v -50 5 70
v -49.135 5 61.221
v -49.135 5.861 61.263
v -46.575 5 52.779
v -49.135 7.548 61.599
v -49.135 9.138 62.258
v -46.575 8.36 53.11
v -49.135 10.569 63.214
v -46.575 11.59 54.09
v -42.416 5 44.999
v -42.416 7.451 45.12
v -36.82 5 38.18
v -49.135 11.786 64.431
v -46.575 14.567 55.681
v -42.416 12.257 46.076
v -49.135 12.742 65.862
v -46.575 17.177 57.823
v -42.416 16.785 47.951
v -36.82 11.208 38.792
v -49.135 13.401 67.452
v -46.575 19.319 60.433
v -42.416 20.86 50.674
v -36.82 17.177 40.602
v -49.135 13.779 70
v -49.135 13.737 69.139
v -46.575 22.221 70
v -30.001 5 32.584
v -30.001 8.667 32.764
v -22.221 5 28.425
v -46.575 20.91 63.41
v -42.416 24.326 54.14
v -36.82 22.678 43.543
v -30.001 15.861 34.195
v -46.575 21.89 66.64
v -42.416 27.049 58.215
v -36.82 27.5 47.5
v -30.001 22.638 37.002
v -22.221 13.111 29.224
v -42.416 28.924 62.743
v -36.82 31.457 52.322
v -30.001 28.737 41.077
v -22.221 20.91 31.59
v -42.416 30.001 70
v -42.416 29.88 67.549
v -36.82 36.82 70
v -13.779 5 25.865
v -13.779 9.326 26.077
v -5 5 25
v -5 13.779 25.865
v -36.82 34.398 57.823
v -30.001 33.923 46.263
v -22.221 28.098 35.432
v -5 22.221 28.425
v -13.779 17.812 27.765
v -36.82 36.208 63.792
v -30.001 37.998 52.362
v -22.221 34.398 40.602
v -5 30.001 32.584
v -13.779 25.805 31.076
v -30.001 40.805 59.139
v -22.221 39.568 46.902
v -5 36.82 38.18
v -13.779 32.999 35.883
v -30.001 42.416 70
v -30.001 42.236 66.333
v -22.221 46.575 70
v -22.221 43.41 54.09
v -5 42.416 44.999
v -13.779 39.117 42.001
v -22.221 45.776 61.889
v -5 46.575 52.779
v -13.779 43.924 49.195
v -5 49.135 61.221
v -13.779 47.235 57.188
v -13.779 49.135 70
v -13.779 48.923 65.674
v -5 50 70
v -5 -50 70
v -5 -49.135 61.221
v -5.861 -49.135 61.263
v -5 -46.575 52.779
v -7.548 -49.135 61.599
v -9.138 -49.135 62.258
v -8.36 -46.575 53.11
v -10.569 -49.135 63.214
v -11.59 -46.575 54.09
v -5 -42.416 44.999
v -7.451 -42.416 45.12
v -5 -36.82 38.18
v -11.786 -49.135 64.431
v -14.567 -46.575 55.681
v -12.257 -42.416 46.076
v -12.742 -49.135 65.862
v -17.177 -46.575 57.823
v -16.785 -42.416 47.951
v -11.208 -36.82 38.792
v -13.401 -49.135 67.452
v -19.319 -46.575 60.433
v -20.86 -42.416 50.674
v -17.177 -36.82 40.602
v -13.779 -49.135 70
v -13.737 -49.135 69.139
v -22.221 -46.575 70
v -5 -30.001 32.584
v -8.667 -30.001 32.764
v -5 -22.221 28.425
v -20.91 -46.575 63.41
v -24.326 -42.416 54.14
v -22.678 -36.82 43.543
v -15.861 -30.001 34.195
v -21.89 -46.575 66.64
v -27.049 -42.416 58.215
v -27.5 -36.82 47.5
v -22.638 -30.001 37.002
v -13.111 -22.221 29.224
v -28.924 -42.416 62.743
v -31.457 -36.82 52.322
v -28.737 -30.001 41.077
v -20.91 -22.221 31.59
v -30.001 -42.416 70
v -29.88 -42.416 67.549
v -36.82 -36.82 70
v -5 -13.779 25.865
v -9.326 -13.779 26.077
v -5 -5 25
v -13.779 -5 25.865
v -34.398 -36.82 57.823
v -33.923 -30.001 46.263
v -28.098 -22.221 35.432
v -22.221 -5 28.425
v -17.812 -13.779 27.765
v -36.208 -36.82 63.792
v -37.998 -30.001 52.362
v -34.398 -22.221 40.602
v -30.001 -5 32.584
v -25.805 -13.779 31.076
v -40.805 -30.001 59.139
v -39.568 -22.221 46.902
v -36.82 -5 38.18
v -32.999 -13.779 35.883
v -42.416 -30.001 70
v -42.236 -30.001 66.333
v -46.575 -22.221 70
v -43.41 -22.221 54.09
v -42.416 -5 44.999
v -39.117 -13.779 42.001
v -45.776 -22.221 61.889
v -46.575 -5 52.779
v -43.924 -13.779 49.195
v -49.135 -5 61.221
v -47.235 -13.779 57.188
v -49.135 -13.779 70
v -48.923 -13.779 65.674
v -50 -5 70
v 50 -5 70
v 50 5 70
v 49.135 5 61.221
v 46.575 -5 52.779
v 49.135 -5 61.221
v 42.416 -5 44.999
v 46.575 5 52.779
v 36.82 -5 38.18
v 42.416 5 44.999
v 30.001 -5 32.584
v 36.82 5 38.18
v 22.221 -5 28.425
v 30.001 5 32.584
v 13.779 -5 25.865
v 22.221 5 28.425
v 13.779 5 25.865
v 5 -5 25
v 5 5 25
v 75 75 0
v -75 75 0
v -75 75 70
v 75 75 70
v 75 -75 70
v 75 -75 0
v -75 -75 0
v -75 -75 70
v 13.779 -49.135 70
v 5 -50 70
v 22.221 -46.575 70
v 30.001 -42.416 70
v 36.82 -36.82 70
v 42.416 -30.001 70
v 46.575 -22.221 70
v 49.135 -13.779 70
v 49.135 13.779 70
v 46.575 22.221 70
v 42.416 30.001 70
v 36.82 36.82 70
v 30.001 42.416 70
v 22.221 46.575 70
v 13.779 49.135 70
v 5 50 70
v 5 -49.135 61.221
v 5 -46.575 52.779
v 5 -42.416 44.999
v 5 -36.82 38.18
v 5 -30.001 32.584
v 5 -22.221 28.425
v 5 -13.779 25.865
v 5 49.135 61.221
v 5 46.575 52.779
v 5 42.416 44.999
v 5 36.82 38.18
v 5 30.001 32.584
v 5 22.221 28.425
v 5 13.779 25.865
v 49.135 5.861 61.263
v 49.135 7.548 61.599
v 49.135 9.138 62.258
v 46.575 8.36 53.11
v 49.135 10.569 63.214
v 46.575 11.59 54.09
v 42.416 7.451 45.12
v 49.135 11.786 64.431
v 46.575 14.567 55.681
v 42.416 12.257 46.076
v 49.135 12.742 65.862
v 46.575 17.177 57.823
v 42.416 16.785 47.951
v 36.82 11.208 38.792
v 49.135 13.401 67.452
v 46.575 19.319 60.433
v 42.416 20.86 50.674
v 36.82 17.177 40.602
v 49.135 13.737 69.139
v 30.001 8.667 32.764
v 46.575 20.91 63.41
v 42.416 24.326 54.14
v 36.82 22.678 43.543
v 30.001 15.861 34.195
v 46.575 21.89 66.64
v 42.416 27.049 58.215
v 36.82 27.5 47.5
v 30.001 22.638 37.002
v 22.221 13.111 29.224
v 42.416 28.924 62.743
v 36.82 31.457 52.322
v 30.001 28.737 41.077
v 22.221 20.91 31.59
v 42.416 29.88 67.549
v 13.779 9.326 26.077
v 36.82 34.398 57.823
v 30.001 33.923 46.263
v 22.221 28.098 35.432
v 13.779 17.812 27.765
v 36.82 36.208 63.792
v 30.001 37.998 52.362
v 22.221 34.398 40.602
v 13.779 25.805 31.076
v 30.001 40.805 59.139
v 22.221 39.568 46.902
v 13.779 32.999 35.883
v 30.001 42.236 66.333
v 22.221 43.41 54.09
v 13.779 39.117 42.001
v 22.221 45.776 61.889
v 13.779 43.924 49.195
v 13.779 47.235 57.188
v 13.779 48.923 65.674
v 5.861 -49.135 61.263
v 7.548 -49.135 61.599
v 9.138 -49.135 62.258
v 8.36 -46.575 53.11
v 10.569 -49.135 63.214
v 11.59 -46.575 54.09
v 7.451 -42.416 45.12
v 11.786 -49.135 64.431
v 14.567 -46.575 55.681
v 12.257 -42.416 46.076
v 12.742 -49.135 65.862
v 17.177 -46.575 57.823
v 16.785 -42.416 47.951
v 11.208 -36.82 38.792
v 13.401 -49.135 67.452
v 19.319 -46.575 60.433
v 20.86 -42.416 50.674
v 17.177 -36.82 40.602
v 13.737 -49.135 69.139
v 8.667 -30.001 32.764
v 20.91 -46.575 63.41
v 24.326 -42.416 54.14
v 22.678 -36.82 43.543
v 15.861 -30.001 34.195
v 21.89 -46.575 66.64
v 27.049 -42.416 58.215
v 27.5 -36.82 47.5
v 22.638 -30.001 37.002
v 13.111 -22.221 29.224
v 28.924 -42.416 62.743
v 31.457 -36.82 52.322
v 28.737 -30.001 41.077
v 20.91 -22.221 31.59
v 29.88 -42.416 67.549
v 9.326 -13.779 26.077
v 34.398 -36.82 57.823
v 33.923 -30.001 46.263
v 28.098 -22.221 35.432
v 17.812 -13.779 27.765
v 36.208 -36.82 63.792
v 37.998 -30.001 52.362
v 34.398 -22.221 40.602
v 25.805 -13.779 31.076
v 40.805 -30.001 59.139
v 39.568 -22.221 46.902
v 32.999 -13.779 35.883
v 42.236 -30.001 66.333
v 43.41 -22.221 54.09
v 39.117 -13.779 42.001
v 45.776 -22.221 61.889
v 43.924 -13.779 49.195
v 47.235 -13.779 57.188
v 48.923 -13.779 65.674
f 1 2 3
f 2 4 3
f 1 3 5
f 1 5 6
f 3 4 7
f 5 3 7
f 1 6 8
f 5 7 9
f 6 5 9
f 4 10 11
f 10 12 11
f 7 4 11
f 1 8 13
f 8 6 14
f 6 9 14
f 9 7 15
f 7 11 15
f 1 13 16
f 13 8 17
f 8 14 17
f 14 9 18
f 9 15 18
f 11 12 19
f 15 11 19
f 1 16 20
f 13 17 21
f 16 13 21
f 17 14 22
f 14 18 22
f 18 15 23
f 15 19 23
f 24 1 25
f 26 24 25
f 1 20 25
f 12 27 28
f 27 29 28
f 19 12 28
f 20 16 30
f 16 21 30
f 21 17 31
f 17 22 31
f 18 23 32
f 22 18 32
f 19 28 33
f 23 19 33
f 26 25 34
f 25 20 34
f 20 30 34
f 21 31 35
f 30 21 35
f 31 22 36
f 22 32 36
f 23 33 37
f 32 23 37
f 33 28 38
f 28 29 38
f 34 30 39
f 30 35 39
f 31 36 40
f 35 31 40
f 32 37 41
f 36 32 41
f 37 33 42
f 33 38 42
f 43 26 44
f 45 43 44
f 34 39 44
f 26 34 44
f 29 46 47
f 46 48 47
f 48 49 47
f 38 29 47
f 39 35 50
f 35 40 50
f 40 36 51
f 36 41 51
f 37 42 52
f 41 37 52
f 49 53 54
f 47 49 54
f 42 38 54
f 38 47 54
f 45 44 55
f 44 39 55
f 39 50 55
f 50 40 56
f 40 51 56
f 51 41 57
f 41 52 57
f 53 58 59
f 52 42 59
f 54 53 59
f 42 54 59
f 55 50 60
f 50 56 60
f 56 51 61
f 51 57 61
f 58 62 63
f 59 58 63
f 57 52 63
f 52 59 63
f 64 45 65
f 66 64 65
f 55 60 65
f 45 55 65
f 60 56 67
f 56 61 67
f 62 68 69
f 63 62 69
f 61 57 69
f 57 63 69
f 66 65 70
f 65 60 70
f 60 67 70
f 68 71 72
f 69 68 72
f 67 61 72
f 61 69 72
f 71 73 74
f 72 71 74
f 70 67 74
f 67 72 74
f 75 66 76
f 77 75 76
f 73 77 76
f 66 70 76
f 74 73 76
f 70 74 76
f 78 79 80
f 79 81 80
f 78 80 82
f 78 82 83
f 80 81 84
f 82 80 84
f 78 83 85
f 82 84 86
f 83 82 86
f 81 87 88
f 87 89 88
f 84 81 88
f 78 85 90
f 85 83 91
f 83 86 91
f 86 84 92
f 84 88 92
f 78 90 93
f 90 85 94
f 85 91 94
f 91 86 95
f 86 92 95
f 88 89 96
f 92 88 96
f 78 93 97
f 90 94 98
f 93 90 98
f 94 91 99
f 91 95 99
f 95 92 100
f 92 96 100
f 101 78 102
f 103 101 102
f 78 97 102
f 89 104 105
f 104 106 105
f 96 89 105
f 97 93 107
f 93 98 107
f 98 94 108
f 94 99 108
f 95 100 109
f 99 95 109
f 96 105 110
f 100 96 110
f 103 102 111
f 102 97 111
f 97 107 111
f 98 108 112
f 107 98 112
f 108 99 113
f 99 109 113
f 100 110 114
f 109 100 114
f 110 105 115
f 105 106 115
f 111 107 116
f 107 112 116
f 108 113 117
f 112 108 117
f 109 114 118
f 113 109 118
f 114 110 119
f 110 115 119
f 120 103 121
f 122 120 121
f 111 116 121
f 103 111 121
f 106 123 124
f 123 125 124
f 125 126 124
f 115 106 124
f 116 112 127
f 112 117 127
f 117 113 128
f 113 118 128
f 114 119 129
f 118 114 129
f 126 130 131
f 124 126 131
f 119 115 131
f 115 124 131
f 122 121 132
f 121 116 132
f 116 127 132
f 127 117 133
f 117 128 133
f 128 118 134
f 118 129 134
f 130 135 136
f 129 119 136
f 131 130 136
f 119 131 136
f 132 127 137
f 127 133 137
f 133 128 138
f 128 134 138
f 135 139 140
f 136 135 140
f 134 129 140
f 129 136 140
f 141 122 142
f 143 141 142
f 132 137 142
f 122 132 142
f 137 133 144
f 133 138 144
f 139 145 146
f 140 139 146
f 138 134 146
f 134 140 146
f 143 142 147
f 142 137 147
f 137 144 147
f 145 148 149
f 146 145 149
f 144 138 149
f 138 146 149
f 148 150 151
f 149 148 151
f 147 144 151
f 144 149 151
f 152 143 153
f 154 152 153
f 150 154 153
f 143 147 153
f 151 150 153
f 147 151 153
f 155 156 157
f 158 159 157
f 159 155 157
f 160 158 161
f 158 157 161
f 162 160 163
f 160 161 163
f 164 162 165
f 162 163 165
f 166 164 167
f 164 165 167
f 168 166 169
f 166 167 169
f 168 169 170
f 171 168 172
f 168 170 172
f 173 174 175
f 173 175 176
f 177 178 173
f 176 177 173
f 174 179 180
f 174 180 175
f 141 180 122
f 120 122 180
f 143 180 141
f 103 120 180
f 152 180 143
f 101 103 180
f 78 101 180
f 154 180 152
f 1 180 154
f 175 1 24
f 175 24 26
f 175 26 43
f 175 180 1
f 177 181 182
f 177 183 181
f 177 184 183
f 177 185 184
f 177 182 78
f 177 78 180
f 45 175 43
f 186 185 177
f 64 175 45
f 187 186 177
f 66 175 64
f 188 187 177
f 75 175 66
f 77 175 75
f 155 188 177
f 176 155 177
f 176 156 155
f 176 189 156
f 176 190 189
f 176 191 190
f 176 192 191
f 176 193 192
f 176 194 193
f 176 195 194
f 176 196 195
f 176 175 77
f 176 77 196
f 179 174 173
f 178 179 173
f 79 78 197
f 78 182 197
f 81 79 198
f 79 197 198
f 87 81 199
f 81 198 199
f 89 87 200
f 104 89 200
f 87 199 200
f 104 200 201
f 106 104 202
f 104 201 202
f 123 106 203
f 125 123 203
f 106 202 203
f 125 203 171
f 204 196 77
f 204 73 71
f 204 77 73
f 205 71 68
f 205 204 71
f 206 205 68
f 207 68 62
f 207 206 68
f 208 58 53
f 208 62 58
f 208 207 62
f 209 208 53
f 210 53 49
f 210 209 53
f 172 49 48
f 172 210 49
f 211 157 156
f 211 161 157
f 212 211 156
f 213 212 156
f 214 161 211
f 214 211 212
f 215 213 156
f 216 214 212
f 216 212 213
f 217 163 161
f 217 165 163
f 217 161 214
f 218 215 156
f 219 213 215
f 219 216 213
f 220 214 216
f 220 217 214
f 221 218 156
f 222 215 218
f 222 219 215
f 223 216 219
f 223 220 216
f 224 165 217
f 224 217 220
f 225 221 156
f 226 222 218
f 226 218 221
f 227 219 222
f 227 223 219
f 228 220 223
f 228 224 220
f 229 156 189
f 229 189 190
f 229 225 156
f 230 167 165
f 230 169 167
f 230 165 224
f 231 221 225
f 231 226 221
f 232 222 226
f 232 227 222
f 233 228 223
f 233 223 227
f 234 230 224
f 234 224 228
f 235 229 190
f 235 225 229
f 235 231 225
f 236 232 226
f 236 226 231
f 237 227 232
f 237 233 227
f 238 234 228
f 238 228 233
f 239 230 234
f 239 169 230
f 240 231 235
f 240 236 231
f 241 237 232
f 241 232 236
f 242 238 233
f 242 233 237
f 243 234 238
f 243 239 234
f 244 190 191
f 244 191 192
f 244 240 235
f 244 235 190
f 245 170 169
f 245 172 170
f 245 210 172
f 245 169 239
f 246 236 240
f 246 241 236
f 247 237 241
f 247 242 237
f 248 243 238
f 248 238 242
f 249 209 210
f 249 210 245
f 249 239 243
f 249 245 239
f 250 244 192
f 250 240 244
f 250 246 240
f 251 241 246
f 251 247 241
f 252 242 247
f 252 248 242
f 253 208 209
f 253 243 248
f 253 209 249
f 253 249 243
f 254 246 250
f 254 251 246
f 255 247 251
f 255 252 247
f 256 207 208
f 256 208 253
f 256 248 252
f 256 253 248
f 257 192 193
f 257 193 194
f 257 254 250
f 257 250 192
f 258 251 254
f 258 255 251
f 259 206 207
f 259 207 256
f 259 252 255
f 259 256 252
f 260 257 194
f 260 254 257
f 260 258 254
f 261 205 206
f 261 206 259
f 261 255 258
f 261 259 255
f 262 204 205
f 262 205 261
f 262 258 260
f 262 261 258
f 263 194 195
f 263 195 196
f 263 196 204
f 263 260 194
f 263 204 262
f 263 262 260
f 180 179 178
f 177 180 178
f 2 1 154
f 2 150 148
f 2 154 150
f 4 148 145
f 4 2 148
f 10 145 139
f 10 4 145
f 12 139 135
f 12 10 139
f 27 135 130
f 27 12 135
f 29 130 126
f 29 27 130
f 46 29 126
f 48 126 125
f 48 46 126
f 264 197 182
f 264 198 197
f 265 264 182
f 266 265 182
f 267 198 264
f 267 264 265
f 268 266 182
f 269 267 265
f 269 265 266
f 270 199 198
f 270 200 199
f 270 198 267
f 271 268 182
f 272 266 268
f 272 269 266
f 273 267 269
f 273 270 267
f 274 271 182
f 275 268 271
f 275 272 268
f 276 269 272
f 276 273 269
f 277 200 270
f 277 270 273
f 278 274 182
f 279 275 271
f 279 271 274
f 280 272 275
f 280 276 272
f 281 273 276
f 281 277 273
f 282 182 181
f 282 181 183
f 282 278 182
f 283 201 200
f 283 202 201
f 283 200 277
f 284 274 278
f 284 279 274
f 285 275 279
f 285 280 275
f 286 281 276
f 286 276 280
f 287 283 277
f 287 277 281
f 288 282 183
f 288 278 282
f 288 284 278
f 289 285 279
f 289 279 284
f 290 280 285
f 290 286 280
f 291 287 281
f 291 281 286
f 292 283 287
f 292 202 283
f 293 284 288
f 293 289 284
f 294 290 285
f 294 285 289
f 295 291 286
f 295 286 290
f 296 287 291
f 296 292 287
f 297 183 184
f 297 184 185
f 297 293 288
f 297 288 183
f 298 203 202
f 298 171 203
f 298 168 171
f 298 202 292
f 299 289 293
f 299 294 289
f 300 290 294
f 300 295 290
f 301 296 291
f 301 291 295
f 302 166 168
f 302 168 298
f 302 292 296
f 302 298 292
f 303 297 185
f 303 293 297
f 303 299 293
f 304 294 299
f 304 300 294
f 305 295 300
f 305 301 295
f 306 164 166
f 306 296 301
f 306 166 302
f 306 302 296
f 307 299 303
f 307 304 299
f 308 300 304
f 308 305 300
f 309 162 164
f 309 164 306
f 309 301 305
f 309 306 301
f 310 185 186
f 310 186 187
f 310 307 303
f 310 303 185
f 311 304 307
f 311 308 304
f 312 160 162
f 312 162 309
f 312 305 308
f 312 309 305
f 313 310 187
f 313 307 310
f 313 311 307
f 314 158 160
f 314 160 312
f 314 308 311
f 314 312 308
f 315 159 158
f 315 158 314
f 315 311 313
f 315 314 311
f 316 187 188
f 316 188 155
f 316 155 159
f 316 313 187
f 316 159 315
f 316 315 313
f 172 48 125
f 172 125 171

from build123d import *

# Parameters (mm, degrees)
F0_W     = 150
F0_H     = 150
F1_DEPTH = 70
F2_T     = -25
F3_R     = 44.99999


# Not quite as in the source:
# - a fillet or chamfer is up to 0.001 mm smaller than in the source, because OpenCascade refuses the exact size


with BuildPart() as f1:
    # F0 (on Top) → F1 (new body)
    with BuildSketch(Plane.XY):
        Rectangle(F0_W, F0_H)
    extrude(amount=F1_DEPTH)

    # F2
    f2_openings = [f1.faces().sort_by_distance(p)[0] for p in [
        (0, 0, 70),
    ]]
    offset(amount=F2_T, openings=f2_openings)

    # F3 (radius 45 in the source; OpenCascade refuses exactly that, so slightly less here)
    f3_edges = [f1.edges().sort_by_distance(p)[0] for p in [
        (0, 50, 25),
        (-50, 0, 25),
        (50, 0, 25),
        (0, -50, 25),
        (50, -50, 47.5),
        (50, 50, 47.5),
        (-50, 50, 47.5),
        (-50, -50, 47.5),
    ]]
    fillet(f3_edges, radius=F3_R)


solid = f1.part
